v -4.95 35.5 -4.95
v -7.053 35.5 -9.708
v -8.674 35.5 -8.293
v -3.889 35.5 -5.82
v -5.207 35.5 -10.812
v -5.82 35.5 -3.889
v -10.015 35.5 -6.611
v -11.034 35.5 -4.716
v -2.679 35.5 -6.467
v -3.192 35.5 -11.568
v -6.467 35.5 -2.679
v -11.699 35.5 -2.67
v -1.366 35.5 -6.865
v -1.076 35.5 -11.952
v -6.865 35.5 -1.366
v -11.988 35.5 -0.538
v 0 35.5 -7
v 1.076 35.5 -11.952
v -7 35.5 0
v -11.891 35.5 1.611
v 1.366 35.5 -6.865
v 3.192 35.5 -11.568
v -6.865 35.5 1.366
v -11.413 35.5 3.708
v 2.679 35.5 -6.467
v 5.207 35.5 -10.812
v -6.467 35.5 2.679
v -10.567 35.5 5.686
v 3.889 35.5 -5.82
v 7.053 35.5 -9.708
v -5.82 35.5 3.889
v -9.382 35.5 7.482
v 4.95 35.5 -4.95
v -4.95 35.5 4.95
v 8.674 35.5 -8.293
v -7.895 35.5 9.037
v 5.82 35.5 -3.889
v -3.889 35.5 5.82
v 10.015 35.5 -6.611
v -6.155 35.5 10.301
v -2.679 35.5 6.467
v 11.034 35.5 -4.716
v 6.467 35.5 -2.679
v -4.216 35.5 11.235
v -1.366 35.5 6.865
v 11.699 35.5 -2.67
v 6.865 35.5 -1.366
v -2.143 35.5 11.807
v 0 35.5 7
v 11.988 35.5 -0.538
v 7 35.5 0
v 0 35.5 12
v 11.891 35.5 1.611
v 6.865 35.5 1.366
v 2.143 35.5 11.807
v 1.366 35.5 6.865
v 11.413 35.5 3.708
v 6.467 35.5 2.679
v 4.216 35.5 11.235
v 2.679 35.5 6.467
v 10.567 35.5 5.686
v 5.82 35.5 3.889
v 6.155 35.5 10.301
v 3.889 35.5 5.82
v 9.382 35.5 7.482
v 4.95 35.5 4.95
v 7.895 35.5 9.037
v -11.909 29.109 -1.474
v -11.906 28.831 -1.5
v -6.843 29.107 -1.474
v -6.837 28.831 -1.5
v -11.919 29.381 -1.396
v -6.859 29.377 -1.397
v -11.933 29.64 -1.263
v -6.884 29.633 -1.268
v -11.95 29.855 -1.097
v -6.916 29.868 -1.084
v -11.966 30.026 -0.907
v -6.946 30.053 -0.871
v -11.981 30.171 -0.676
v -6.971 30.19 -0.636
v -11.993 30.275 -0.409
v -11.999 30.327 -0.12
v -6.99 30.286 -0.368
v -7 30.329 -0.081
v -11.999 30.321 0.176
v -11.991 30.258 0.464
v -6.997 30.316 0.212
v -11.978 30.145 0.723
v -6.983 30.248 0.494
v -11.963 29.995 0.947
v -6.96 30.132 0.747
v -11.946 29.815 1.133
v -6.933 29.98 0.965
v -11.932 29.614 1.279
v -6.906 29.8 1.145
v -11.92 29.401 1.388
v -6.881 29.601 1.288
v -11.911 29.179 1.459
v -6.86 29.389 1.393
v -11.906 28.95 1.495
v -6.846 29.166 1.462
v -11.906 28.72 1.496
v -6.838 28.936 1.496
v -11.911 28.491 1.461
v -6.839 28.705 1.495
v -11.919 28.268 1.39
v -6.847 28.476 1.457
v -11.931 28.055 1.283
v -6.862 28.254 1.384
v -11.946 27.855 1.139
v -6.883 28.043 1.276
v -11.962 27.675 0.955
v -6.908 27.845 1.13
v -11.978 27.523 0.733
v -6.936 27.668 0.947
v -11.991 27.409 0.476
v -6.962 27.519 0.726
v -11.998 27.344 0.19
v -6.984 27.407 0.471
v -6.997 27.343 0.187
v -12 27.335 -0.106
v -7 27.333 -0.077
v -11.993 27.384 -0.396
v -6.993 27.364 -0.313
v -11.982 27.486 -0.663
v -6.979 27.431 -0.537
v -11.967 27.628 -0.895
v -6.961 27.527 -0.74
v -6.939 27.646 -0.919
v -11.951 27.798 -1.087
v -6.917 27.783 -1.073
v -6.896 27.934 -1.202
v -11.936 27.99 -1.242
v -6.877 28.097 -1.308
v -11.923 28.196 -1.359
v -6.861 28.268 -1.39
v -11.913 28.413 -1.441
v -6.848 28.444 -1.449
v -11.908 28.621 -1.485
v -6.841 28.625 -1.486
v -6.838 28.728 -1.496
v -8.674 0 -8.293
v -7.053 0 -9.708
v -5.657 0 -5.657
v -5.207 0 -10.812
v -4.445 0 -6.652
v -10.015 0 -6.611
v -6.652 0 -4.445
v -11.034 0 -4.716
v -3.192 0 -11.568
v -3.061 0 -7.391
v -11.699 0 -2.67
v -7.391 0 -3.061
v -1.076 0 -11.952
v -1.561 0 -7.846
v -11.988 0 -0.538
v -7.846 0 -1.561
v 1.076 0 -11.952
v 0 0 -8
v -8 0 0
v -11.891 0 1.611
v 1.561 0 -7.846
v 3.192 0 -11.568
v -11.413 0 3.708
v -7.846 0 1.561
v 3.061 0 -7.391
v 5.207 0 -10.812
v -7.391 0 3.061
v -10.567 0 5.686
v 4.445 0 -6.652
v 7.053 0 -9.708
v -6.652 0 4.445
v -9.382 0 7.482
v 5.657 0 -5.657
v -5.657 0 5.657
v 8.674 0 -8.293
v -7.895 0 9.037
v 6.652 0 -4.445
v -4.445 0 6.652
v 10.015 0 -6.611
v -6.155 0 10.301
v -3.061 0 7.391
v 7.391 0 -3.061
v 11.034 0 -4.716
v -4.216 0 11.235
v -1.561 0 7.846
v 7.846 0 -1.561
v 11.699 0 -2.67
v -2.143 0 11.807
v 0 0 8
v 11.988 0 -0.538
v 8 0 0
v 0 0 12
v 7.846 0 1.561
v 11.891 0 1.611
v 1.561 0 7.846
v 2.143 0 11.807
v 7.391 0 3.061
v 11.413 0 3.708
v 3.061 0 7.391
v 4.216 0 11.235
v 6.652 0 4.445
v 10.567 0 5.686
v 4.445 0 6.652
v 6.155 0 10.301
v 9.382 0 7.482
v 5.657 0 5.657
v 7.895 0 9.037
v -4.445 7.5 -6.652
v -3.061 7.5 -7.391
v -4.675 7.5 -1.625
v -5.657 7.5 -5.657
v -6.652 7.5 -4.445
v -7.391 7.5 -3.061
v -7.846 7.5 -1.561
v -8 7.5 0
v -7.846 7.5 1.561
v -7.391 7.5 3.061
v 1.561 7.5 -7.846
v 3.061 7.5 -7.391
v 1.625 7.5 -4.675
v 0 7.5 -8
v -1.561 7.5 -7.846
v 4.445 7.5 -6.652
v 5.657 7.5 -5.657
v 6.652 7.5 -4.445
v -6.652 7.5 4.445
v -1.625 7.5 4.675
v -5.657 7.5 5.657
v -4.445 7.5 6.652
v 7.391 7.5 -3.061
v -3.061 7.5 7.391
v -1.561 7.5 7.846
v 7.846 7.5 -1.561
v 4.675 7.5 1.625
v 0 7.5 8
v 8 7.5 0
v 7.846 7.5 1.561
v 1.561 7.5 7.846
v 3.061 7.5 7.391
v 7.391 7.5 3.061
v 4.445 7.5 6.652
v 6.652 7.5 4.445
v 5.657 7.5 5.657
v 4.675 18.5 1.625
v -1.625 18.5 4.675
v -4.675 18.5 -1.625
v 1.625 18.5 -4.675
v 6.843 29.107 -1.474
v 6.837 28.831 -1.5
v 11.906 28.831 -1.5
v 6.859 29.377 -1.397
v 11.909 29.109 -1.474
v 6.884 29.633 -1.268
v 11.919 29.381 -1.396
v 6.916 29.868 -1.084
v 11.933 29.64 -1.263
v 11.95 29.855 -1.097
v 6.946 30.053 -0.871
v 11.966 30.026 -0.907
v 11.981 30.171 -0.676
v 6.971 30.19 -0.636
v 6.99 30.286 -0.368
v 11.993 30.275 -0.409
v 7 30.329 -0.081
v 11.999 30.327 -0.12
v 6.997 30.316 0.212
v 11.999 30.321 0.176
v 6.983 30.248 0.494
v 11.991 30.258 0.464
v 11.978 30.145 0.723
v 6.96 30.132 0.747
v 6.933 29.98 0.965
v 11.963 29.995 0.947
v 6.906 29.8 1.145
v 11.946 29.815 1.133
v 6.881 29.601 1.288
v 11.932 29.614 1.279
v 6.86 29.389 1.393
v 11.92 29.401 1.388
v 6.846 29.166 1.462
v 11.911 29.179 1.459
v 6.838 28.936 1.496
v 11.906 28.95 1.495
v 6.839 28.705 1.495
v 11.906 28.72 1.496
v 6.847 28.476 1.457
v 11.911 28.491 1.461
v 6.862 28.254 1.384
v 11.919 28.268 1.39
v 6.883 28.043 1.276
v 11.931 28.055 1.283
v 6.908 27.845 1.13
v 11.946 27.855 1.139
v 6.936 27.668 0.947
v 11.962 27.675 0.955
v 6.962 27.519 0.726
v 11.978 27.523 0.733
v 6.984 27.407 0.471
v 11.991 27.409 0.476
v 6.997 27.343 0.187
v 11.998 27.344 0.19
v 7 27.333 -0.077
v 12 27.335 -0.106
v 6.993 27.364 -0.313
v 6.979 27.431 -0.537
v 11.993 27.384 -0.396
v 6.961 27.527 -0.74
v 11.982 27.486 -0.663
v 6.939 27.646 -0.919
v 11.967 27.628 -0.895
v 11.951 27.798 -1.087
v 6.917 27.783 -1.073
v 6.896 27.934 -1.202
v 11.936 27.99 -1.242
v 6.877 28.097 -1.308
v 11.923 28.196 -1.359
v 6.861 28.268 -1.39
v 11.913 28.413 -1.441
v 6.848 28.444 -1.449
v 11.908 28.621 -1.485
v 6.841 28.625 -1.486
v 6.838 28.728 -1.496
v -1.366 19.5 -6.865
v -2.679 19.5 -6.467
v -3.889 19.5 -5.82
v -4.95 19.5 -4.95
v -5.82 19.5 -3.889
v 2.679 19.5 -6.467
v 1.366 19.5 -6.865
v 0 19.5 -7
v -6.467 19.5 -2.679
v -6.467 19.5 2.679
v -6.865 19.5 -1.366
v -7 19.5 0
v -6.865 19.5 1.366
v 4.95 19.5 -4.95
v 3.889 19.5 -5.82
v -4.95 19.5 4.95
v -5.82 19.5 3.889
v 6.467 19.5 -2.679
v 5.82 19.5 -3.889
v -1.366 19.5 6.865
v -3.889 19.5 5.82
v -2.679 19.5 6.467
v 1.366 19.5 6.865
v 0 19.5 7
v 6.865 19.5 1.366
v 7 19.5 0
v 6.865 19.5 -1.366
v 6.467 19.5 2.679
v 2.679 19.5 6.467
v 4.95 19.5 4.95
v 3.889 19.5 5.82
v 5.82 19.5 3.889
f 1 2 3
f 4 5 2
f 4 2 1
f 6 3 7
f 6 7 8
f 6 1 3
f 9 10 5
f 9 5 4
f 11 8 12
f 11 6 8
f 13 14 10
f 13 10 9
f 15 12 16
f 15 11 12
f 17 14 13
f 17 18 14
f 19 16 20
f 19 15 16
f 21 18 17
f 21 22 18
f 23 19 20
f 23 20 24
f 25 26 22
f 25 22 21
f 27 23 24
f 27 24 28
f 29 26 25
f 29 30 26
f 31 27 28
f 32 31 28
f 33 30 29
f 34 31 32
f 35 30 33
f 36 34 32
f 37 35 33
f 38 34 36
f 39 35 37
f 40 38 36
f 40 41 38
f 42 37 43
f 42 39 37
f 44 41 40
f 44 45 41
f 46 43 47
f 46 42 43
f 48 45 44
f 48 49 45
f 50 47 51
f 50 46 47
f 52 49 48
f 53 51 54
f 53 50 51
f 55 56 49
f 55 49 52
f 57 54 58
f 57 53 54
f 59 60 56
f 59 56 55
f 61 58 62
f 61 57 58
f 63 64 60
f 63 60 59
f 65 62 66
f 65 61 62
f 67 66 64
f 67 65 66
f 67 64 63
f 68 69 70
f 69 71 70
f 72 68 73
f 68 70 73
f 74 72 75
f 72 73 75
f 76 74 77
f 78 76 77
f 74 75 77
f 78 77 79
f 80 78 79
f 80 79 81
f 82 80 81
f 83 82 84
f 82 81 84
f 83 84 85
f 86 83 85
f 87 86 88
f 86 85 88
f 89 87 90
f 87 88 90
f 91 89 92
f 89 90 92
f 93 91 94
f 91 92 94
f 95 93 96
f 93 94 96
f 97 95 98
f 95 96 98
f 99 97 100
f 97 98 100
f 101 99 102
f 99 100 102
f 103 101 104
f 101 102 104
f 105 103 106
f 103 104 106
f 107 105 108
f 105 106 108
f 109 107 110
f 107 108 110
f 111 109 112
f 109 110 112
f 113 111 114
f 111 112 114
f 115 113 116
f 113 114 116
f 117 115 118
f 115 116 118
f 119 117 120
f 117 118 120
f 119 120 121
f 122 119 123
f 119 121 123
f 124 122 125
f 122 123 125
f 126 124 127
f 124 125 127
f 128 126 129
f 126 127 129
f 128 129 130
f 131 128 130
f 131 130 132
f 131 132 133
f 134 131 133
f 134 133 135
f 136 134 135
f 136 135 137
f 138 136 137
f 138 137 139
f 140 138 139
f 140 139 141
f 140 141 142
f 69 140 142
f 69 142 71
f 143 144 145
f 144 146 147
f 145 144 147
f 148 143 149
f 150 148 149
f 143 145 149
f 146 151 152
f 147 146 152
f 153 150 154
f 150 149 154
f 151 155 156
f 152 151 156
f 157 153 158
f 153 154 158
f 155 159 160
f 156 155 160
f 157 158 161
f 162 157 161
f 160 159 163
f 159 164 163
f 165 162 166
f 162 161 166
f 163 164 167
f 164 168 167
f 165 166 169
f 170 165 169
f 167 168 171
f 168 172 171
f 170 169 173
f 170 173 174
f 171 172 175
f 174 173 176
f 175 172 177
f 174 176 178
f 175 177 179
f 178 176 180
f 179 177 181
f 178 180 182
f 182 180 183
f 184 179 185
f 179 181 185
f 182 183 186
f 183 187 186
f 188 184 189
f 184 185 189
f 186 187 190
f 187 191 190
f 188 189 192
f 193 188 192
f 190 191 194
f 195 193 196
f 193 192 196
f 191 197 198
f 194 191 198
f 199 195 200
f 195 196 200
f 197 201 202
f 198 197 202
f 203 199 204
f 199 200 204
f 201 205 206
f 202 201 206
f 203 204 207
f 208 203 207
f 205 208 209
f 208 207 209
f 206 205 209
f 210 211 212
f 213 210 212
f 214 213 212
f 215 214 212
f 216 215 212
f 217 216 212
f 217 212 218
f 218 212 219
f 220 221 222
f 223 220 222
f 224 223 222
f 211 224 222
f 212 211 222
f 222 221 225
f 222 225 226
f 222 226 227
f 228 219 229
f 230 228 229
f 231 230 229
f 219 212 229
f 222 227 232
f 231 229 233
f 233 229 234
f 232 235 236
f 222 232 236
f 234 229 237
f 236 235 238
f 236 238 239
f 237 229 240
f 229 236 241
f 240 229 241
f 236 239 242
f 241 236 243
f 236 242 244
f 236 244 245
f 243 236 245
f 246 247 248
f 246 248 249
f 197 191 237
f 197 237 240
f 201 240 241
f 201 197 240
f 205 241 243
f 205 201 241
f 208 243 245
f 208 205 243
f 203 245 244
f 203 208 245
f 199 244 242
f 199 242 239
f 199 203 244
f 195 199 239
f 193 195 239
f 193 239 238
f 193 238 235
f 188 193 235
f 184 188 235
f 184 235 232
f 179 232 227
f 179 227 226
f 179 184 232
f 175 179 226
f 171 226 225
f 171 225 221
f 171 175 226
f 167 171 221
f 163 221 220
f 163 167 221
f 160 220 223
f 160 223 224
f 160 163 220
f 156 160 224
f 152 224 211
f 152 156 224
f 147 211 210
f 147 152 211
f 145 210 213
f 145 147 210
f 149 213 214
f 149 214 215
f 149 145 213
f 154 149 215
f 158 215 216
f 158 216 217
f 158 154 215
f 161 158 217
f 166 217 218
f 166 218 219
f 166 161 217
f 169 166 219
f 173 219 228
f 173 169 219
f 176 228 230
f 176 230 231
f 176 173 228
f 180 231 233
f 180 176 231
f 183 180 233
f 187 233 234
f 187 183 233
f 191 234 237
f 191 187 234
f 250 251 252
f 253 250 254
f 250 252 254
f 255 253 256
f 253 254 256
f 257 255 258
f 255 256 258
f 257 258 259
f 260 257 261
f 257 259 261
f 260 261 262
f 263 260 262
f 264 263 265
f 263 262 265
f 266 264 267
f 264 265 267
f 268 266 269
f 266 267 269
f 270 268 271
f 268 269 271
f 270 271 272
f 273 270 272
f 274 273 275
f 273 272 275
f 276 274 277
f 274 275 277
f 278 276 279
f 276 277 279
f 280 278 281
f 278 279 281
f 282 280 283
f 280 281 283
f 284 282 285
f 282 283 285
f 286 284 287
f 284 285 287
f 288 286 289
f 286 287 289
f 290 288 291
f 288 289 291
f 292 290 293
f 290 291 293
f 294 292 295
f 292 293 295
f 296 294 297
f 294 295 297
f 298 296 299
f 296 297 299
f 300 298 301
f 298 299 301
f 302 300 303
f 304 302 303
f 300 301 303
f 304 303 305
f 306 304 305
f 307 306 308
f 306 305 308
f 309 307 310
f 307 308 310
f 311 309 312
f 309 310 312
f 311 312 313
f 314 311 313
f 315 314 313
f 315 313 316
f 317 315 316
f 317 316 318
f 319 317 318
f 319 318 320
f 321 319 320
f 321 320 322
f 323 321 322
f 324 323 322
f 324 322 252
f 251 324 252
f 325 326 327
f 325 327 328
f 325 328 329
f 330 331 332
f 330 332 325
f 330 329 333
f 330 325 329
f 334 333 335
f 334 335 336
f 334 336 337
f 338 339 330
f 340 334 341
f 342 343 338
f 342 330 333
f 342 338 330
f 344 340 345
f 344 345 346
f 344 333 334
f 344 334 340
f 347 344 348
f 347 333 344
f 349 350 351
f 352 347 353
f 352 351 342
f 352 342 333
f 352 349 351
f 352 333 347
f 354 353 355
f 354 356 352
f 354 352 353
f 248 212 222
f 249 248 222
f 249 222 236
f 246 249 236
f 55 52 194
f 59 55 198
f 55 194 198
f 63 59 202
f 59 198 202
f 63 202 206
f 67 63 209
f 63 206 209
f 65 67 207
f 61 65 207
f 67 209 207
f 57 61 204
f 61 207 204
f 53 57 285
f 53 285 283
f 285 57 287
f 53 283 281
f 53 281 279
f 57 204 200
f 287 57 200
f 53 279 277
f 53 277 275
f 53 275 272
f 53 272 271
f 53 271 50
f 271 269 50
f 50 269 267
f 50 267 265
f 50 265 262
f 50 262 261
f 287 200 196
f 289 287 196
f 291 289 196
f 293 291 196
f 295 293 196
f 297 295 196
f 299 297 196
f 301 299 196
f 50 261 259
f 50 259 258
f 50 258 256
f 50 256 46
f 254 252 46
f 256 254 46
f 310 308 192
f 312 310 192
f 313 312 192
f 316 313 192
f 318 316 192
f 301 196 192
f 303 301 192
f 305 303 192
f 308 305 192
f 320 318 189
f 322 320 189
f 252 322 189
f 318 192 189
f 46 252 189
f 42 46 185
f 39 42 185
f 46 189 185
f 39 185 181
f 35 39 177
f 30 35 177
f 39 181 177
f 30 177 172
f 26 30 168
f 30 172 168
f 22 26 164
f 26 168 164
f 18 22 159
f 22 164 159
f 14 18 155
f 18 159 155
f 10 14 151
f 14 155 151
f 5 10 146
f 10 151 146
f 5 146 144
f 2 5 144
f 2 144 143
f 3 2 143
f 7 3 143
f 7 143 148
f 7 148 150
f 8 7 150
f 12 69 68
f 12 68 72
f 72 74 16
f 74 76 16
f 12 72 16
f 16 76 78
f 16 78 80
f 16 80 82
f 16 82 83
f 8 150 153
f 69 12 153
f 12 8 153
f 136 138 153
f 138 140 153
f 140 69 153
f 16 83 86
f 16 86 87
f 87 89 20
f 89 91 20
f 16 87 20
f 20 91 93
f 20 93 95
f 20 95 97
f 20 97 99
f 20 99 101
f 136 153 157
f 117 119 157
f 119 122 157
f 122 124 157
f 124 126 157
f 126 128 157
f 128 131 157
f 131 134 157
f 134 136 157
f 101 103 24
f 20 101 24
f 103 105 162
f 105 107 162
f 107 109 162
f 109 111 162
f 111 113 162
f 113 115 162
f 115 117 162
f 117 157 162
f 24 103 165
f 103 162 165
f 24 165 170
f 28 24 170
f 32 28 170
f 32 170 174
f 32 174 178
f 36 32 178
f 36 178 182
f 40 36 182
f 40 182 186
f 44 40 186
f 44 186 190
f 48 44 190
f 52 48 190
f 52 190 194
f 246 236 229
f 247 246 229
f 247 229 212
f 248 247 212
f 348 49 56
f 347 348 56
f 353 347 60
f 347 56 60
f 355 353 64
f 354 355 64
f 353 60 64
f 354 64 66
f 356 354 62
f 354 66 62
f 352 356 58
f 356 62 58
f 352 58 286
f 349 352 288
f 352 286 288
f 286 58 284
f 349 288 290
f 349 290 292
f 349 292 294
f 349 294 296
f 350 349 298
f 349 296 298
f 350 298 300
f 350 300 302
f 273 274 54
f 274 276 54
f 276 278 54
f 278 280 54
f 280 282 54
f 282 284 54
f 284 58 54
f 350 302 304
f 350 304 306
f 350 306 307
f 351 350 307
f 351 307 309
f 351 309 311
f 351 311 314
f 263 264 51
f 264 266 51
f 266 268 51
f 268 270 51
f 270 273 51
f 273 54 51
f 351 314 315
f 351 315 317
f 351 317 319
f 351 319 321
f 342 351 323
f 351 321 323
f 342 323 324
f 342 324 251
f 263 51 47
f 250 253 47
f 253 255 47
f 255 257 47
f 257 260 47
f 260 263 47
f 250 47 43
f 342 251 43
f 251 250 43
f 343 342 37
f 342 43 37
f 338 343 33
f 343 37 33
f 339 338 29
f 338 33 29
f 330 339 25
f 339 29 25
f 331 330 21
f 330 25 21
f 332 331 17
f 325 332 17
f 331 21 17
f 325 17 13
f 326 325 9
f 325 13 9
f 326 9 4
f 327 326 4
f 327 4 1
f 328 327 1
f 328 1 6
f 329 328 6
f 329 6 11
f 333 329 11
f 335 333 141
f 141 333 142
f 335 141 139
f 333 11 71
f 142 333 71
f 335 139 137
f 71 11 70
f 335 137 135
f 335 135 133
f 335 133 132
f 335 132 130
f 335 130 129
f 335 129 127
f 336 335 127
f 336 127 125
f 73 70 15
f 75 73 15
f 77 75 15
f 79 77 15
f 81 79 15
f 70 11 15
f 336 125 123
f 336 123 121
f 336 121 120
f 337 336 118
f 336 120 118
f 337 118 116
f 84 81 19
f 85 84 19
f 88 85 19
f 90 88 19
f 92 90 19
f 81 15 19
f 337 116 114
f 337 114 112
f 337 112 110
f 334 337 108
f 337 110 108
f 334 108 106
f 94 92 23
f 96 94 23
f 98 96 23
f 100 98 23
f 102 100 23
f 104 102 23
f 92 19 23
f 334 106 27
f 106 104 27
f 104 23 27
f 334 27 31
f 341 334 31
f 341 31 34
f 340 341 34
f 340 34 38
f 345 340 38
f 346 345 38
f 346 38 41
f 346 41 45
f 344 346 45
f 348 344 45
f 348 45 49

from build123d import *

# Parameters (mm, degrees)
SKETCH_1_R          = 12
SKETCH_1_R_2        = 8
EXTRUDE_1_DEPTH     = 7.5
SKETCH_2_R          = 12
EXTRUDE_2_DEPTH     = 28
CUT_EXTRUDE_3_DEPTH = 11
SKETCH_4_R          = 7
CUT_EXTRUDE_4_DEPTH = 16
SKETCH_5_R          = 1.5
CUT_EXTRUDE_5_DEPTH = 30


with BuildPart() as part:
    # Эскиз1 → Вытянуть1 (new body)
    with BuildSketch(Plane(origin=(0, 0, 0), x_dir=(1, 0, 0), z_dir=(0, 1, 0))):
        with Locations(Location((0, 0, 0), (0, 0, 270))):
            Circle(SKETCH_1_R)
        with Locations(Location((0, 0, 0), (0, 0, 270))):
            Circle(SKETCH_1_R_2, mode=Mode.SUBTRACT)
    extrude(amount=EXTRUDE_1_DEPTH)

    # Эскиз2 → Вытянуть2 (add)
    with BuildSketch(Plane(origin=(0, 7.5, 0), x_dir=(1, 0, 0), z_dir=(0, 1, 0))):
        with Locations(Location((0, 0, 0), (0, 0, 270))):
            Circle(SKETCH_2_R)
    extrude(amount=EXTRUDE_2_DEPTH)

    # Эскиз3 → Вытянуть3 (cut)
    with BuildSketch(Plane.XZ.offset(-7.5)):
        Polygon((4.675379912, 1.625060824), (-1.625060824, 4.675379912), (-4.675379912, -1.625060824), (1.625060824, -4.675379912), align=None)
    extrude(amount=-CUT_EXTRUDE_3_DEPTH, mode=Mode.SUBTRACT)

    # Эскиз4 → Вытянуть4 (cut)
    with BuildSketch(Plane(origin=(0, 35.5, 0), x_dir=(1, 0, 0), z_dir=(0, 1, 0))):
        with Locations(Location((0, 0, 0), (0, 0, 270))):
            Circle(SKETCH_4_R)
    extrude(amount=-CUT_EXTRUDE_4_DEPTH, mode=Mode.SUBTRACT)

    # Эскиз5 → Вытянуть5 (cut, symmetric)
    with BuildSketch(Plane(origin=(0, 0, 0), x_dir=(0, 0, -1), z_dir=(1, 0, 0))):
        with Locations((0, 28.831403322)):
            Circle(SKETCH_5_R)
    extrude(amount=CUT_EXTRUDE_5_DEPTH, both=True, mode=Mode.SUBTRACT)


solid = part.part
